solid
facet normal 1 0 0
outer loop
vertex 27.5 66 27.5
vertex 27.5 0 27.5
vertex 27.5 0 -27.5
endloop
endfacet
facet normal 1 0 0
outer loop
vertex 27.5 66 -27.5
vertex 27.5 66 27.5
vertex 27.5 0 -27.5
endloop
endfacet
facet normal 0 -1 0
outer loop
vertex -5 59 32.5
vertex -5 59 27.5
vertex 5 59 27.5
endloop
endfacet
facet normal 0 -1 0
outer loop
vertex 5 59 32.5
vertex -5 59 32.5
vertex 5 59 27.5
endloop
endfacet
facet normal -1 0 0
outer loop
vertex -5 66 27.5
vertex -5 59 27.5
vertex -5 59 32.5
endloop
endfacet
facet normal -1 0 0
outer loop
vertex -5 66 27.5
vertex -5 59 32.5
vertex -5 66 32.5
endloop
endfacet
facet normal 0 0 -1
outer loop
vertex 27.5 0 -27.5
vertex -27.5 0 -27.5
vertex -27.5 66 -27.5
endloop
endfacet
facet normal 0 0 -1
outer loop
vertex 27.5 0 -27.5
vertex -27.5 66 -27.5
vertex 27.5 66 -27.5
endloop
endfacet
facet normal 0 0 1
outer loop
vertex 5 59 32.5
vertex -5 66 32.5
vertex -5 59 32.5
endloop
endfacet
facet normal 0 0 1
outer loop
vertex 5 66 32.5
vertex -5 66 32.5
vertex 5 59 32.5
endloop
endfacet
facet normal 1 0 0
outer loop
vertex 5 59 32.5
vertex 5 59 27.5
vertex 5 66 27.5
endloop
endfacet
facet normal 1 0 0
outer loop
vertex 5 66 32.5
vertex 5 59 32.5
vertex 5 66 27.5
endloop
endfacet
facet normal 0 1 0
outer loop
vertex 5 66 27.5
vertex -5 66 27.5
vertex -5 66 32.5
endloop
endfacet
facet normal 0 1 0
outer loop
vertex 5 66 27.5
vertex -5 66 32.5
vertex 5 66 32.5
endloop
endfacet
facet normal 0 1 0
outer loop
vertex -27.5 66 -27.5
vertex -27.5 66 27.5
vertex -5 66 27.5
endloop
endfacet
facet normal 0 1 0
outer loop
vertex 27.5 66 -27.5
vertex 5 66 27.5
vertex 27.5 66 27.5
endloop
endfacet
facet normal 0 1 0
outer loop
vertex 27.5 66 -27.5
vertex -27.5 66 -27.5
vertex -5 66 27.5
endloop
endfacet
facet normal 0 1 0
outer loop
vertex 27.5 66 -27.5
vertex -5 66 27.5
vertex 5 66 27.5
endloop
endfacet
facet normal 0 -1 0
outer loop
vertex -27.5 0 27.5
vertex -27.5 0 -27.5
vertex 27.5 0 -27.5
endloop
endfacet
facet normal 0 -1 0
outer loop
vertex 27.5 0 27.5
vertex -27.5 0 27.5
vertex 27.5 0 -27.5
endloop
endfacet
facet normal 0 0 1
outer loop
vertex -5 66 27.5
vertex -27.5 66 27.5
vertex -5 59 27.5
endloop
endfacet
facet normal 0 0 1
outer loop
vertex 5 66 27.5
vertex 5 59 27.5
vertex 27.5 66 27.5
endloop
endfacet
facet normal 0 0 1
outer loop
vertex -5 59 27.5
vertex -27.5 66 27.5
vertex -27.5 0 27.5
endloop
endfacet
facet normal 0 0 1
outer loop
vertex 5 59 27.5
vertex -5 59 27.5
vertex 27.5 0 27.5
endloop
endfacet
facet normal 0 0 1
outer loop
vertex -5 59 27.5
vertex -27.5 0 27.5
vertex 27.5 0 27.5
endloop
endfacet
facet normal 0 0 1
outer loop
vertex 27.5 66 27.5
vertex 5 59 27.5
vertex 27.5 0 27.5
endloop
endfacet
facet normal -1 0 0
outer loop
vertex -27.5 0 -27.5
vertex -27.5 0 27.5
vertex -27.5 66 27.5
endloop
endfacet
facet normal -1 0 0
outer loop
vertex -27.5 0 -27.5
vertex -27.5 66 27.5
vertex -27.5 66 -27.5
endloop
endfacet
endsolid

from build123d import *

# Parameters (mm, degrees)
SKETCH_1_W      = 55
SKETCH_1_H      = 55
EXTRUDE_1_DEPTH = 66
SKETCH_2_W      = 10
SKETCH_2_H      = 7
EXTRUDE_2_DEPTH = 5


with BuildPart() as part:
    # 草图1 → 凸台-拉伸1 (new body)
    with BuildSketch(Plane(origin=(0, 0, 0), x_dir=(1, 0, 0), z_dir=(0, 1, 0))):
        Rectangle(SKETCH_1_W, SKETCH_1_H)
    extrude(amount=EXTRUDE_1_DEPTH)

    # 草图2 → 凸台-拉伸2 (add)
    with BuildSketch(Plane.XY.offset(27.5)):
        with Locations((0, 62.5)):
            Rectangle(SKETCH_2_W, SKETCH_2_H)
    extrude(amount=EXTRUDE_2_DEPTH)


solid = part.part
